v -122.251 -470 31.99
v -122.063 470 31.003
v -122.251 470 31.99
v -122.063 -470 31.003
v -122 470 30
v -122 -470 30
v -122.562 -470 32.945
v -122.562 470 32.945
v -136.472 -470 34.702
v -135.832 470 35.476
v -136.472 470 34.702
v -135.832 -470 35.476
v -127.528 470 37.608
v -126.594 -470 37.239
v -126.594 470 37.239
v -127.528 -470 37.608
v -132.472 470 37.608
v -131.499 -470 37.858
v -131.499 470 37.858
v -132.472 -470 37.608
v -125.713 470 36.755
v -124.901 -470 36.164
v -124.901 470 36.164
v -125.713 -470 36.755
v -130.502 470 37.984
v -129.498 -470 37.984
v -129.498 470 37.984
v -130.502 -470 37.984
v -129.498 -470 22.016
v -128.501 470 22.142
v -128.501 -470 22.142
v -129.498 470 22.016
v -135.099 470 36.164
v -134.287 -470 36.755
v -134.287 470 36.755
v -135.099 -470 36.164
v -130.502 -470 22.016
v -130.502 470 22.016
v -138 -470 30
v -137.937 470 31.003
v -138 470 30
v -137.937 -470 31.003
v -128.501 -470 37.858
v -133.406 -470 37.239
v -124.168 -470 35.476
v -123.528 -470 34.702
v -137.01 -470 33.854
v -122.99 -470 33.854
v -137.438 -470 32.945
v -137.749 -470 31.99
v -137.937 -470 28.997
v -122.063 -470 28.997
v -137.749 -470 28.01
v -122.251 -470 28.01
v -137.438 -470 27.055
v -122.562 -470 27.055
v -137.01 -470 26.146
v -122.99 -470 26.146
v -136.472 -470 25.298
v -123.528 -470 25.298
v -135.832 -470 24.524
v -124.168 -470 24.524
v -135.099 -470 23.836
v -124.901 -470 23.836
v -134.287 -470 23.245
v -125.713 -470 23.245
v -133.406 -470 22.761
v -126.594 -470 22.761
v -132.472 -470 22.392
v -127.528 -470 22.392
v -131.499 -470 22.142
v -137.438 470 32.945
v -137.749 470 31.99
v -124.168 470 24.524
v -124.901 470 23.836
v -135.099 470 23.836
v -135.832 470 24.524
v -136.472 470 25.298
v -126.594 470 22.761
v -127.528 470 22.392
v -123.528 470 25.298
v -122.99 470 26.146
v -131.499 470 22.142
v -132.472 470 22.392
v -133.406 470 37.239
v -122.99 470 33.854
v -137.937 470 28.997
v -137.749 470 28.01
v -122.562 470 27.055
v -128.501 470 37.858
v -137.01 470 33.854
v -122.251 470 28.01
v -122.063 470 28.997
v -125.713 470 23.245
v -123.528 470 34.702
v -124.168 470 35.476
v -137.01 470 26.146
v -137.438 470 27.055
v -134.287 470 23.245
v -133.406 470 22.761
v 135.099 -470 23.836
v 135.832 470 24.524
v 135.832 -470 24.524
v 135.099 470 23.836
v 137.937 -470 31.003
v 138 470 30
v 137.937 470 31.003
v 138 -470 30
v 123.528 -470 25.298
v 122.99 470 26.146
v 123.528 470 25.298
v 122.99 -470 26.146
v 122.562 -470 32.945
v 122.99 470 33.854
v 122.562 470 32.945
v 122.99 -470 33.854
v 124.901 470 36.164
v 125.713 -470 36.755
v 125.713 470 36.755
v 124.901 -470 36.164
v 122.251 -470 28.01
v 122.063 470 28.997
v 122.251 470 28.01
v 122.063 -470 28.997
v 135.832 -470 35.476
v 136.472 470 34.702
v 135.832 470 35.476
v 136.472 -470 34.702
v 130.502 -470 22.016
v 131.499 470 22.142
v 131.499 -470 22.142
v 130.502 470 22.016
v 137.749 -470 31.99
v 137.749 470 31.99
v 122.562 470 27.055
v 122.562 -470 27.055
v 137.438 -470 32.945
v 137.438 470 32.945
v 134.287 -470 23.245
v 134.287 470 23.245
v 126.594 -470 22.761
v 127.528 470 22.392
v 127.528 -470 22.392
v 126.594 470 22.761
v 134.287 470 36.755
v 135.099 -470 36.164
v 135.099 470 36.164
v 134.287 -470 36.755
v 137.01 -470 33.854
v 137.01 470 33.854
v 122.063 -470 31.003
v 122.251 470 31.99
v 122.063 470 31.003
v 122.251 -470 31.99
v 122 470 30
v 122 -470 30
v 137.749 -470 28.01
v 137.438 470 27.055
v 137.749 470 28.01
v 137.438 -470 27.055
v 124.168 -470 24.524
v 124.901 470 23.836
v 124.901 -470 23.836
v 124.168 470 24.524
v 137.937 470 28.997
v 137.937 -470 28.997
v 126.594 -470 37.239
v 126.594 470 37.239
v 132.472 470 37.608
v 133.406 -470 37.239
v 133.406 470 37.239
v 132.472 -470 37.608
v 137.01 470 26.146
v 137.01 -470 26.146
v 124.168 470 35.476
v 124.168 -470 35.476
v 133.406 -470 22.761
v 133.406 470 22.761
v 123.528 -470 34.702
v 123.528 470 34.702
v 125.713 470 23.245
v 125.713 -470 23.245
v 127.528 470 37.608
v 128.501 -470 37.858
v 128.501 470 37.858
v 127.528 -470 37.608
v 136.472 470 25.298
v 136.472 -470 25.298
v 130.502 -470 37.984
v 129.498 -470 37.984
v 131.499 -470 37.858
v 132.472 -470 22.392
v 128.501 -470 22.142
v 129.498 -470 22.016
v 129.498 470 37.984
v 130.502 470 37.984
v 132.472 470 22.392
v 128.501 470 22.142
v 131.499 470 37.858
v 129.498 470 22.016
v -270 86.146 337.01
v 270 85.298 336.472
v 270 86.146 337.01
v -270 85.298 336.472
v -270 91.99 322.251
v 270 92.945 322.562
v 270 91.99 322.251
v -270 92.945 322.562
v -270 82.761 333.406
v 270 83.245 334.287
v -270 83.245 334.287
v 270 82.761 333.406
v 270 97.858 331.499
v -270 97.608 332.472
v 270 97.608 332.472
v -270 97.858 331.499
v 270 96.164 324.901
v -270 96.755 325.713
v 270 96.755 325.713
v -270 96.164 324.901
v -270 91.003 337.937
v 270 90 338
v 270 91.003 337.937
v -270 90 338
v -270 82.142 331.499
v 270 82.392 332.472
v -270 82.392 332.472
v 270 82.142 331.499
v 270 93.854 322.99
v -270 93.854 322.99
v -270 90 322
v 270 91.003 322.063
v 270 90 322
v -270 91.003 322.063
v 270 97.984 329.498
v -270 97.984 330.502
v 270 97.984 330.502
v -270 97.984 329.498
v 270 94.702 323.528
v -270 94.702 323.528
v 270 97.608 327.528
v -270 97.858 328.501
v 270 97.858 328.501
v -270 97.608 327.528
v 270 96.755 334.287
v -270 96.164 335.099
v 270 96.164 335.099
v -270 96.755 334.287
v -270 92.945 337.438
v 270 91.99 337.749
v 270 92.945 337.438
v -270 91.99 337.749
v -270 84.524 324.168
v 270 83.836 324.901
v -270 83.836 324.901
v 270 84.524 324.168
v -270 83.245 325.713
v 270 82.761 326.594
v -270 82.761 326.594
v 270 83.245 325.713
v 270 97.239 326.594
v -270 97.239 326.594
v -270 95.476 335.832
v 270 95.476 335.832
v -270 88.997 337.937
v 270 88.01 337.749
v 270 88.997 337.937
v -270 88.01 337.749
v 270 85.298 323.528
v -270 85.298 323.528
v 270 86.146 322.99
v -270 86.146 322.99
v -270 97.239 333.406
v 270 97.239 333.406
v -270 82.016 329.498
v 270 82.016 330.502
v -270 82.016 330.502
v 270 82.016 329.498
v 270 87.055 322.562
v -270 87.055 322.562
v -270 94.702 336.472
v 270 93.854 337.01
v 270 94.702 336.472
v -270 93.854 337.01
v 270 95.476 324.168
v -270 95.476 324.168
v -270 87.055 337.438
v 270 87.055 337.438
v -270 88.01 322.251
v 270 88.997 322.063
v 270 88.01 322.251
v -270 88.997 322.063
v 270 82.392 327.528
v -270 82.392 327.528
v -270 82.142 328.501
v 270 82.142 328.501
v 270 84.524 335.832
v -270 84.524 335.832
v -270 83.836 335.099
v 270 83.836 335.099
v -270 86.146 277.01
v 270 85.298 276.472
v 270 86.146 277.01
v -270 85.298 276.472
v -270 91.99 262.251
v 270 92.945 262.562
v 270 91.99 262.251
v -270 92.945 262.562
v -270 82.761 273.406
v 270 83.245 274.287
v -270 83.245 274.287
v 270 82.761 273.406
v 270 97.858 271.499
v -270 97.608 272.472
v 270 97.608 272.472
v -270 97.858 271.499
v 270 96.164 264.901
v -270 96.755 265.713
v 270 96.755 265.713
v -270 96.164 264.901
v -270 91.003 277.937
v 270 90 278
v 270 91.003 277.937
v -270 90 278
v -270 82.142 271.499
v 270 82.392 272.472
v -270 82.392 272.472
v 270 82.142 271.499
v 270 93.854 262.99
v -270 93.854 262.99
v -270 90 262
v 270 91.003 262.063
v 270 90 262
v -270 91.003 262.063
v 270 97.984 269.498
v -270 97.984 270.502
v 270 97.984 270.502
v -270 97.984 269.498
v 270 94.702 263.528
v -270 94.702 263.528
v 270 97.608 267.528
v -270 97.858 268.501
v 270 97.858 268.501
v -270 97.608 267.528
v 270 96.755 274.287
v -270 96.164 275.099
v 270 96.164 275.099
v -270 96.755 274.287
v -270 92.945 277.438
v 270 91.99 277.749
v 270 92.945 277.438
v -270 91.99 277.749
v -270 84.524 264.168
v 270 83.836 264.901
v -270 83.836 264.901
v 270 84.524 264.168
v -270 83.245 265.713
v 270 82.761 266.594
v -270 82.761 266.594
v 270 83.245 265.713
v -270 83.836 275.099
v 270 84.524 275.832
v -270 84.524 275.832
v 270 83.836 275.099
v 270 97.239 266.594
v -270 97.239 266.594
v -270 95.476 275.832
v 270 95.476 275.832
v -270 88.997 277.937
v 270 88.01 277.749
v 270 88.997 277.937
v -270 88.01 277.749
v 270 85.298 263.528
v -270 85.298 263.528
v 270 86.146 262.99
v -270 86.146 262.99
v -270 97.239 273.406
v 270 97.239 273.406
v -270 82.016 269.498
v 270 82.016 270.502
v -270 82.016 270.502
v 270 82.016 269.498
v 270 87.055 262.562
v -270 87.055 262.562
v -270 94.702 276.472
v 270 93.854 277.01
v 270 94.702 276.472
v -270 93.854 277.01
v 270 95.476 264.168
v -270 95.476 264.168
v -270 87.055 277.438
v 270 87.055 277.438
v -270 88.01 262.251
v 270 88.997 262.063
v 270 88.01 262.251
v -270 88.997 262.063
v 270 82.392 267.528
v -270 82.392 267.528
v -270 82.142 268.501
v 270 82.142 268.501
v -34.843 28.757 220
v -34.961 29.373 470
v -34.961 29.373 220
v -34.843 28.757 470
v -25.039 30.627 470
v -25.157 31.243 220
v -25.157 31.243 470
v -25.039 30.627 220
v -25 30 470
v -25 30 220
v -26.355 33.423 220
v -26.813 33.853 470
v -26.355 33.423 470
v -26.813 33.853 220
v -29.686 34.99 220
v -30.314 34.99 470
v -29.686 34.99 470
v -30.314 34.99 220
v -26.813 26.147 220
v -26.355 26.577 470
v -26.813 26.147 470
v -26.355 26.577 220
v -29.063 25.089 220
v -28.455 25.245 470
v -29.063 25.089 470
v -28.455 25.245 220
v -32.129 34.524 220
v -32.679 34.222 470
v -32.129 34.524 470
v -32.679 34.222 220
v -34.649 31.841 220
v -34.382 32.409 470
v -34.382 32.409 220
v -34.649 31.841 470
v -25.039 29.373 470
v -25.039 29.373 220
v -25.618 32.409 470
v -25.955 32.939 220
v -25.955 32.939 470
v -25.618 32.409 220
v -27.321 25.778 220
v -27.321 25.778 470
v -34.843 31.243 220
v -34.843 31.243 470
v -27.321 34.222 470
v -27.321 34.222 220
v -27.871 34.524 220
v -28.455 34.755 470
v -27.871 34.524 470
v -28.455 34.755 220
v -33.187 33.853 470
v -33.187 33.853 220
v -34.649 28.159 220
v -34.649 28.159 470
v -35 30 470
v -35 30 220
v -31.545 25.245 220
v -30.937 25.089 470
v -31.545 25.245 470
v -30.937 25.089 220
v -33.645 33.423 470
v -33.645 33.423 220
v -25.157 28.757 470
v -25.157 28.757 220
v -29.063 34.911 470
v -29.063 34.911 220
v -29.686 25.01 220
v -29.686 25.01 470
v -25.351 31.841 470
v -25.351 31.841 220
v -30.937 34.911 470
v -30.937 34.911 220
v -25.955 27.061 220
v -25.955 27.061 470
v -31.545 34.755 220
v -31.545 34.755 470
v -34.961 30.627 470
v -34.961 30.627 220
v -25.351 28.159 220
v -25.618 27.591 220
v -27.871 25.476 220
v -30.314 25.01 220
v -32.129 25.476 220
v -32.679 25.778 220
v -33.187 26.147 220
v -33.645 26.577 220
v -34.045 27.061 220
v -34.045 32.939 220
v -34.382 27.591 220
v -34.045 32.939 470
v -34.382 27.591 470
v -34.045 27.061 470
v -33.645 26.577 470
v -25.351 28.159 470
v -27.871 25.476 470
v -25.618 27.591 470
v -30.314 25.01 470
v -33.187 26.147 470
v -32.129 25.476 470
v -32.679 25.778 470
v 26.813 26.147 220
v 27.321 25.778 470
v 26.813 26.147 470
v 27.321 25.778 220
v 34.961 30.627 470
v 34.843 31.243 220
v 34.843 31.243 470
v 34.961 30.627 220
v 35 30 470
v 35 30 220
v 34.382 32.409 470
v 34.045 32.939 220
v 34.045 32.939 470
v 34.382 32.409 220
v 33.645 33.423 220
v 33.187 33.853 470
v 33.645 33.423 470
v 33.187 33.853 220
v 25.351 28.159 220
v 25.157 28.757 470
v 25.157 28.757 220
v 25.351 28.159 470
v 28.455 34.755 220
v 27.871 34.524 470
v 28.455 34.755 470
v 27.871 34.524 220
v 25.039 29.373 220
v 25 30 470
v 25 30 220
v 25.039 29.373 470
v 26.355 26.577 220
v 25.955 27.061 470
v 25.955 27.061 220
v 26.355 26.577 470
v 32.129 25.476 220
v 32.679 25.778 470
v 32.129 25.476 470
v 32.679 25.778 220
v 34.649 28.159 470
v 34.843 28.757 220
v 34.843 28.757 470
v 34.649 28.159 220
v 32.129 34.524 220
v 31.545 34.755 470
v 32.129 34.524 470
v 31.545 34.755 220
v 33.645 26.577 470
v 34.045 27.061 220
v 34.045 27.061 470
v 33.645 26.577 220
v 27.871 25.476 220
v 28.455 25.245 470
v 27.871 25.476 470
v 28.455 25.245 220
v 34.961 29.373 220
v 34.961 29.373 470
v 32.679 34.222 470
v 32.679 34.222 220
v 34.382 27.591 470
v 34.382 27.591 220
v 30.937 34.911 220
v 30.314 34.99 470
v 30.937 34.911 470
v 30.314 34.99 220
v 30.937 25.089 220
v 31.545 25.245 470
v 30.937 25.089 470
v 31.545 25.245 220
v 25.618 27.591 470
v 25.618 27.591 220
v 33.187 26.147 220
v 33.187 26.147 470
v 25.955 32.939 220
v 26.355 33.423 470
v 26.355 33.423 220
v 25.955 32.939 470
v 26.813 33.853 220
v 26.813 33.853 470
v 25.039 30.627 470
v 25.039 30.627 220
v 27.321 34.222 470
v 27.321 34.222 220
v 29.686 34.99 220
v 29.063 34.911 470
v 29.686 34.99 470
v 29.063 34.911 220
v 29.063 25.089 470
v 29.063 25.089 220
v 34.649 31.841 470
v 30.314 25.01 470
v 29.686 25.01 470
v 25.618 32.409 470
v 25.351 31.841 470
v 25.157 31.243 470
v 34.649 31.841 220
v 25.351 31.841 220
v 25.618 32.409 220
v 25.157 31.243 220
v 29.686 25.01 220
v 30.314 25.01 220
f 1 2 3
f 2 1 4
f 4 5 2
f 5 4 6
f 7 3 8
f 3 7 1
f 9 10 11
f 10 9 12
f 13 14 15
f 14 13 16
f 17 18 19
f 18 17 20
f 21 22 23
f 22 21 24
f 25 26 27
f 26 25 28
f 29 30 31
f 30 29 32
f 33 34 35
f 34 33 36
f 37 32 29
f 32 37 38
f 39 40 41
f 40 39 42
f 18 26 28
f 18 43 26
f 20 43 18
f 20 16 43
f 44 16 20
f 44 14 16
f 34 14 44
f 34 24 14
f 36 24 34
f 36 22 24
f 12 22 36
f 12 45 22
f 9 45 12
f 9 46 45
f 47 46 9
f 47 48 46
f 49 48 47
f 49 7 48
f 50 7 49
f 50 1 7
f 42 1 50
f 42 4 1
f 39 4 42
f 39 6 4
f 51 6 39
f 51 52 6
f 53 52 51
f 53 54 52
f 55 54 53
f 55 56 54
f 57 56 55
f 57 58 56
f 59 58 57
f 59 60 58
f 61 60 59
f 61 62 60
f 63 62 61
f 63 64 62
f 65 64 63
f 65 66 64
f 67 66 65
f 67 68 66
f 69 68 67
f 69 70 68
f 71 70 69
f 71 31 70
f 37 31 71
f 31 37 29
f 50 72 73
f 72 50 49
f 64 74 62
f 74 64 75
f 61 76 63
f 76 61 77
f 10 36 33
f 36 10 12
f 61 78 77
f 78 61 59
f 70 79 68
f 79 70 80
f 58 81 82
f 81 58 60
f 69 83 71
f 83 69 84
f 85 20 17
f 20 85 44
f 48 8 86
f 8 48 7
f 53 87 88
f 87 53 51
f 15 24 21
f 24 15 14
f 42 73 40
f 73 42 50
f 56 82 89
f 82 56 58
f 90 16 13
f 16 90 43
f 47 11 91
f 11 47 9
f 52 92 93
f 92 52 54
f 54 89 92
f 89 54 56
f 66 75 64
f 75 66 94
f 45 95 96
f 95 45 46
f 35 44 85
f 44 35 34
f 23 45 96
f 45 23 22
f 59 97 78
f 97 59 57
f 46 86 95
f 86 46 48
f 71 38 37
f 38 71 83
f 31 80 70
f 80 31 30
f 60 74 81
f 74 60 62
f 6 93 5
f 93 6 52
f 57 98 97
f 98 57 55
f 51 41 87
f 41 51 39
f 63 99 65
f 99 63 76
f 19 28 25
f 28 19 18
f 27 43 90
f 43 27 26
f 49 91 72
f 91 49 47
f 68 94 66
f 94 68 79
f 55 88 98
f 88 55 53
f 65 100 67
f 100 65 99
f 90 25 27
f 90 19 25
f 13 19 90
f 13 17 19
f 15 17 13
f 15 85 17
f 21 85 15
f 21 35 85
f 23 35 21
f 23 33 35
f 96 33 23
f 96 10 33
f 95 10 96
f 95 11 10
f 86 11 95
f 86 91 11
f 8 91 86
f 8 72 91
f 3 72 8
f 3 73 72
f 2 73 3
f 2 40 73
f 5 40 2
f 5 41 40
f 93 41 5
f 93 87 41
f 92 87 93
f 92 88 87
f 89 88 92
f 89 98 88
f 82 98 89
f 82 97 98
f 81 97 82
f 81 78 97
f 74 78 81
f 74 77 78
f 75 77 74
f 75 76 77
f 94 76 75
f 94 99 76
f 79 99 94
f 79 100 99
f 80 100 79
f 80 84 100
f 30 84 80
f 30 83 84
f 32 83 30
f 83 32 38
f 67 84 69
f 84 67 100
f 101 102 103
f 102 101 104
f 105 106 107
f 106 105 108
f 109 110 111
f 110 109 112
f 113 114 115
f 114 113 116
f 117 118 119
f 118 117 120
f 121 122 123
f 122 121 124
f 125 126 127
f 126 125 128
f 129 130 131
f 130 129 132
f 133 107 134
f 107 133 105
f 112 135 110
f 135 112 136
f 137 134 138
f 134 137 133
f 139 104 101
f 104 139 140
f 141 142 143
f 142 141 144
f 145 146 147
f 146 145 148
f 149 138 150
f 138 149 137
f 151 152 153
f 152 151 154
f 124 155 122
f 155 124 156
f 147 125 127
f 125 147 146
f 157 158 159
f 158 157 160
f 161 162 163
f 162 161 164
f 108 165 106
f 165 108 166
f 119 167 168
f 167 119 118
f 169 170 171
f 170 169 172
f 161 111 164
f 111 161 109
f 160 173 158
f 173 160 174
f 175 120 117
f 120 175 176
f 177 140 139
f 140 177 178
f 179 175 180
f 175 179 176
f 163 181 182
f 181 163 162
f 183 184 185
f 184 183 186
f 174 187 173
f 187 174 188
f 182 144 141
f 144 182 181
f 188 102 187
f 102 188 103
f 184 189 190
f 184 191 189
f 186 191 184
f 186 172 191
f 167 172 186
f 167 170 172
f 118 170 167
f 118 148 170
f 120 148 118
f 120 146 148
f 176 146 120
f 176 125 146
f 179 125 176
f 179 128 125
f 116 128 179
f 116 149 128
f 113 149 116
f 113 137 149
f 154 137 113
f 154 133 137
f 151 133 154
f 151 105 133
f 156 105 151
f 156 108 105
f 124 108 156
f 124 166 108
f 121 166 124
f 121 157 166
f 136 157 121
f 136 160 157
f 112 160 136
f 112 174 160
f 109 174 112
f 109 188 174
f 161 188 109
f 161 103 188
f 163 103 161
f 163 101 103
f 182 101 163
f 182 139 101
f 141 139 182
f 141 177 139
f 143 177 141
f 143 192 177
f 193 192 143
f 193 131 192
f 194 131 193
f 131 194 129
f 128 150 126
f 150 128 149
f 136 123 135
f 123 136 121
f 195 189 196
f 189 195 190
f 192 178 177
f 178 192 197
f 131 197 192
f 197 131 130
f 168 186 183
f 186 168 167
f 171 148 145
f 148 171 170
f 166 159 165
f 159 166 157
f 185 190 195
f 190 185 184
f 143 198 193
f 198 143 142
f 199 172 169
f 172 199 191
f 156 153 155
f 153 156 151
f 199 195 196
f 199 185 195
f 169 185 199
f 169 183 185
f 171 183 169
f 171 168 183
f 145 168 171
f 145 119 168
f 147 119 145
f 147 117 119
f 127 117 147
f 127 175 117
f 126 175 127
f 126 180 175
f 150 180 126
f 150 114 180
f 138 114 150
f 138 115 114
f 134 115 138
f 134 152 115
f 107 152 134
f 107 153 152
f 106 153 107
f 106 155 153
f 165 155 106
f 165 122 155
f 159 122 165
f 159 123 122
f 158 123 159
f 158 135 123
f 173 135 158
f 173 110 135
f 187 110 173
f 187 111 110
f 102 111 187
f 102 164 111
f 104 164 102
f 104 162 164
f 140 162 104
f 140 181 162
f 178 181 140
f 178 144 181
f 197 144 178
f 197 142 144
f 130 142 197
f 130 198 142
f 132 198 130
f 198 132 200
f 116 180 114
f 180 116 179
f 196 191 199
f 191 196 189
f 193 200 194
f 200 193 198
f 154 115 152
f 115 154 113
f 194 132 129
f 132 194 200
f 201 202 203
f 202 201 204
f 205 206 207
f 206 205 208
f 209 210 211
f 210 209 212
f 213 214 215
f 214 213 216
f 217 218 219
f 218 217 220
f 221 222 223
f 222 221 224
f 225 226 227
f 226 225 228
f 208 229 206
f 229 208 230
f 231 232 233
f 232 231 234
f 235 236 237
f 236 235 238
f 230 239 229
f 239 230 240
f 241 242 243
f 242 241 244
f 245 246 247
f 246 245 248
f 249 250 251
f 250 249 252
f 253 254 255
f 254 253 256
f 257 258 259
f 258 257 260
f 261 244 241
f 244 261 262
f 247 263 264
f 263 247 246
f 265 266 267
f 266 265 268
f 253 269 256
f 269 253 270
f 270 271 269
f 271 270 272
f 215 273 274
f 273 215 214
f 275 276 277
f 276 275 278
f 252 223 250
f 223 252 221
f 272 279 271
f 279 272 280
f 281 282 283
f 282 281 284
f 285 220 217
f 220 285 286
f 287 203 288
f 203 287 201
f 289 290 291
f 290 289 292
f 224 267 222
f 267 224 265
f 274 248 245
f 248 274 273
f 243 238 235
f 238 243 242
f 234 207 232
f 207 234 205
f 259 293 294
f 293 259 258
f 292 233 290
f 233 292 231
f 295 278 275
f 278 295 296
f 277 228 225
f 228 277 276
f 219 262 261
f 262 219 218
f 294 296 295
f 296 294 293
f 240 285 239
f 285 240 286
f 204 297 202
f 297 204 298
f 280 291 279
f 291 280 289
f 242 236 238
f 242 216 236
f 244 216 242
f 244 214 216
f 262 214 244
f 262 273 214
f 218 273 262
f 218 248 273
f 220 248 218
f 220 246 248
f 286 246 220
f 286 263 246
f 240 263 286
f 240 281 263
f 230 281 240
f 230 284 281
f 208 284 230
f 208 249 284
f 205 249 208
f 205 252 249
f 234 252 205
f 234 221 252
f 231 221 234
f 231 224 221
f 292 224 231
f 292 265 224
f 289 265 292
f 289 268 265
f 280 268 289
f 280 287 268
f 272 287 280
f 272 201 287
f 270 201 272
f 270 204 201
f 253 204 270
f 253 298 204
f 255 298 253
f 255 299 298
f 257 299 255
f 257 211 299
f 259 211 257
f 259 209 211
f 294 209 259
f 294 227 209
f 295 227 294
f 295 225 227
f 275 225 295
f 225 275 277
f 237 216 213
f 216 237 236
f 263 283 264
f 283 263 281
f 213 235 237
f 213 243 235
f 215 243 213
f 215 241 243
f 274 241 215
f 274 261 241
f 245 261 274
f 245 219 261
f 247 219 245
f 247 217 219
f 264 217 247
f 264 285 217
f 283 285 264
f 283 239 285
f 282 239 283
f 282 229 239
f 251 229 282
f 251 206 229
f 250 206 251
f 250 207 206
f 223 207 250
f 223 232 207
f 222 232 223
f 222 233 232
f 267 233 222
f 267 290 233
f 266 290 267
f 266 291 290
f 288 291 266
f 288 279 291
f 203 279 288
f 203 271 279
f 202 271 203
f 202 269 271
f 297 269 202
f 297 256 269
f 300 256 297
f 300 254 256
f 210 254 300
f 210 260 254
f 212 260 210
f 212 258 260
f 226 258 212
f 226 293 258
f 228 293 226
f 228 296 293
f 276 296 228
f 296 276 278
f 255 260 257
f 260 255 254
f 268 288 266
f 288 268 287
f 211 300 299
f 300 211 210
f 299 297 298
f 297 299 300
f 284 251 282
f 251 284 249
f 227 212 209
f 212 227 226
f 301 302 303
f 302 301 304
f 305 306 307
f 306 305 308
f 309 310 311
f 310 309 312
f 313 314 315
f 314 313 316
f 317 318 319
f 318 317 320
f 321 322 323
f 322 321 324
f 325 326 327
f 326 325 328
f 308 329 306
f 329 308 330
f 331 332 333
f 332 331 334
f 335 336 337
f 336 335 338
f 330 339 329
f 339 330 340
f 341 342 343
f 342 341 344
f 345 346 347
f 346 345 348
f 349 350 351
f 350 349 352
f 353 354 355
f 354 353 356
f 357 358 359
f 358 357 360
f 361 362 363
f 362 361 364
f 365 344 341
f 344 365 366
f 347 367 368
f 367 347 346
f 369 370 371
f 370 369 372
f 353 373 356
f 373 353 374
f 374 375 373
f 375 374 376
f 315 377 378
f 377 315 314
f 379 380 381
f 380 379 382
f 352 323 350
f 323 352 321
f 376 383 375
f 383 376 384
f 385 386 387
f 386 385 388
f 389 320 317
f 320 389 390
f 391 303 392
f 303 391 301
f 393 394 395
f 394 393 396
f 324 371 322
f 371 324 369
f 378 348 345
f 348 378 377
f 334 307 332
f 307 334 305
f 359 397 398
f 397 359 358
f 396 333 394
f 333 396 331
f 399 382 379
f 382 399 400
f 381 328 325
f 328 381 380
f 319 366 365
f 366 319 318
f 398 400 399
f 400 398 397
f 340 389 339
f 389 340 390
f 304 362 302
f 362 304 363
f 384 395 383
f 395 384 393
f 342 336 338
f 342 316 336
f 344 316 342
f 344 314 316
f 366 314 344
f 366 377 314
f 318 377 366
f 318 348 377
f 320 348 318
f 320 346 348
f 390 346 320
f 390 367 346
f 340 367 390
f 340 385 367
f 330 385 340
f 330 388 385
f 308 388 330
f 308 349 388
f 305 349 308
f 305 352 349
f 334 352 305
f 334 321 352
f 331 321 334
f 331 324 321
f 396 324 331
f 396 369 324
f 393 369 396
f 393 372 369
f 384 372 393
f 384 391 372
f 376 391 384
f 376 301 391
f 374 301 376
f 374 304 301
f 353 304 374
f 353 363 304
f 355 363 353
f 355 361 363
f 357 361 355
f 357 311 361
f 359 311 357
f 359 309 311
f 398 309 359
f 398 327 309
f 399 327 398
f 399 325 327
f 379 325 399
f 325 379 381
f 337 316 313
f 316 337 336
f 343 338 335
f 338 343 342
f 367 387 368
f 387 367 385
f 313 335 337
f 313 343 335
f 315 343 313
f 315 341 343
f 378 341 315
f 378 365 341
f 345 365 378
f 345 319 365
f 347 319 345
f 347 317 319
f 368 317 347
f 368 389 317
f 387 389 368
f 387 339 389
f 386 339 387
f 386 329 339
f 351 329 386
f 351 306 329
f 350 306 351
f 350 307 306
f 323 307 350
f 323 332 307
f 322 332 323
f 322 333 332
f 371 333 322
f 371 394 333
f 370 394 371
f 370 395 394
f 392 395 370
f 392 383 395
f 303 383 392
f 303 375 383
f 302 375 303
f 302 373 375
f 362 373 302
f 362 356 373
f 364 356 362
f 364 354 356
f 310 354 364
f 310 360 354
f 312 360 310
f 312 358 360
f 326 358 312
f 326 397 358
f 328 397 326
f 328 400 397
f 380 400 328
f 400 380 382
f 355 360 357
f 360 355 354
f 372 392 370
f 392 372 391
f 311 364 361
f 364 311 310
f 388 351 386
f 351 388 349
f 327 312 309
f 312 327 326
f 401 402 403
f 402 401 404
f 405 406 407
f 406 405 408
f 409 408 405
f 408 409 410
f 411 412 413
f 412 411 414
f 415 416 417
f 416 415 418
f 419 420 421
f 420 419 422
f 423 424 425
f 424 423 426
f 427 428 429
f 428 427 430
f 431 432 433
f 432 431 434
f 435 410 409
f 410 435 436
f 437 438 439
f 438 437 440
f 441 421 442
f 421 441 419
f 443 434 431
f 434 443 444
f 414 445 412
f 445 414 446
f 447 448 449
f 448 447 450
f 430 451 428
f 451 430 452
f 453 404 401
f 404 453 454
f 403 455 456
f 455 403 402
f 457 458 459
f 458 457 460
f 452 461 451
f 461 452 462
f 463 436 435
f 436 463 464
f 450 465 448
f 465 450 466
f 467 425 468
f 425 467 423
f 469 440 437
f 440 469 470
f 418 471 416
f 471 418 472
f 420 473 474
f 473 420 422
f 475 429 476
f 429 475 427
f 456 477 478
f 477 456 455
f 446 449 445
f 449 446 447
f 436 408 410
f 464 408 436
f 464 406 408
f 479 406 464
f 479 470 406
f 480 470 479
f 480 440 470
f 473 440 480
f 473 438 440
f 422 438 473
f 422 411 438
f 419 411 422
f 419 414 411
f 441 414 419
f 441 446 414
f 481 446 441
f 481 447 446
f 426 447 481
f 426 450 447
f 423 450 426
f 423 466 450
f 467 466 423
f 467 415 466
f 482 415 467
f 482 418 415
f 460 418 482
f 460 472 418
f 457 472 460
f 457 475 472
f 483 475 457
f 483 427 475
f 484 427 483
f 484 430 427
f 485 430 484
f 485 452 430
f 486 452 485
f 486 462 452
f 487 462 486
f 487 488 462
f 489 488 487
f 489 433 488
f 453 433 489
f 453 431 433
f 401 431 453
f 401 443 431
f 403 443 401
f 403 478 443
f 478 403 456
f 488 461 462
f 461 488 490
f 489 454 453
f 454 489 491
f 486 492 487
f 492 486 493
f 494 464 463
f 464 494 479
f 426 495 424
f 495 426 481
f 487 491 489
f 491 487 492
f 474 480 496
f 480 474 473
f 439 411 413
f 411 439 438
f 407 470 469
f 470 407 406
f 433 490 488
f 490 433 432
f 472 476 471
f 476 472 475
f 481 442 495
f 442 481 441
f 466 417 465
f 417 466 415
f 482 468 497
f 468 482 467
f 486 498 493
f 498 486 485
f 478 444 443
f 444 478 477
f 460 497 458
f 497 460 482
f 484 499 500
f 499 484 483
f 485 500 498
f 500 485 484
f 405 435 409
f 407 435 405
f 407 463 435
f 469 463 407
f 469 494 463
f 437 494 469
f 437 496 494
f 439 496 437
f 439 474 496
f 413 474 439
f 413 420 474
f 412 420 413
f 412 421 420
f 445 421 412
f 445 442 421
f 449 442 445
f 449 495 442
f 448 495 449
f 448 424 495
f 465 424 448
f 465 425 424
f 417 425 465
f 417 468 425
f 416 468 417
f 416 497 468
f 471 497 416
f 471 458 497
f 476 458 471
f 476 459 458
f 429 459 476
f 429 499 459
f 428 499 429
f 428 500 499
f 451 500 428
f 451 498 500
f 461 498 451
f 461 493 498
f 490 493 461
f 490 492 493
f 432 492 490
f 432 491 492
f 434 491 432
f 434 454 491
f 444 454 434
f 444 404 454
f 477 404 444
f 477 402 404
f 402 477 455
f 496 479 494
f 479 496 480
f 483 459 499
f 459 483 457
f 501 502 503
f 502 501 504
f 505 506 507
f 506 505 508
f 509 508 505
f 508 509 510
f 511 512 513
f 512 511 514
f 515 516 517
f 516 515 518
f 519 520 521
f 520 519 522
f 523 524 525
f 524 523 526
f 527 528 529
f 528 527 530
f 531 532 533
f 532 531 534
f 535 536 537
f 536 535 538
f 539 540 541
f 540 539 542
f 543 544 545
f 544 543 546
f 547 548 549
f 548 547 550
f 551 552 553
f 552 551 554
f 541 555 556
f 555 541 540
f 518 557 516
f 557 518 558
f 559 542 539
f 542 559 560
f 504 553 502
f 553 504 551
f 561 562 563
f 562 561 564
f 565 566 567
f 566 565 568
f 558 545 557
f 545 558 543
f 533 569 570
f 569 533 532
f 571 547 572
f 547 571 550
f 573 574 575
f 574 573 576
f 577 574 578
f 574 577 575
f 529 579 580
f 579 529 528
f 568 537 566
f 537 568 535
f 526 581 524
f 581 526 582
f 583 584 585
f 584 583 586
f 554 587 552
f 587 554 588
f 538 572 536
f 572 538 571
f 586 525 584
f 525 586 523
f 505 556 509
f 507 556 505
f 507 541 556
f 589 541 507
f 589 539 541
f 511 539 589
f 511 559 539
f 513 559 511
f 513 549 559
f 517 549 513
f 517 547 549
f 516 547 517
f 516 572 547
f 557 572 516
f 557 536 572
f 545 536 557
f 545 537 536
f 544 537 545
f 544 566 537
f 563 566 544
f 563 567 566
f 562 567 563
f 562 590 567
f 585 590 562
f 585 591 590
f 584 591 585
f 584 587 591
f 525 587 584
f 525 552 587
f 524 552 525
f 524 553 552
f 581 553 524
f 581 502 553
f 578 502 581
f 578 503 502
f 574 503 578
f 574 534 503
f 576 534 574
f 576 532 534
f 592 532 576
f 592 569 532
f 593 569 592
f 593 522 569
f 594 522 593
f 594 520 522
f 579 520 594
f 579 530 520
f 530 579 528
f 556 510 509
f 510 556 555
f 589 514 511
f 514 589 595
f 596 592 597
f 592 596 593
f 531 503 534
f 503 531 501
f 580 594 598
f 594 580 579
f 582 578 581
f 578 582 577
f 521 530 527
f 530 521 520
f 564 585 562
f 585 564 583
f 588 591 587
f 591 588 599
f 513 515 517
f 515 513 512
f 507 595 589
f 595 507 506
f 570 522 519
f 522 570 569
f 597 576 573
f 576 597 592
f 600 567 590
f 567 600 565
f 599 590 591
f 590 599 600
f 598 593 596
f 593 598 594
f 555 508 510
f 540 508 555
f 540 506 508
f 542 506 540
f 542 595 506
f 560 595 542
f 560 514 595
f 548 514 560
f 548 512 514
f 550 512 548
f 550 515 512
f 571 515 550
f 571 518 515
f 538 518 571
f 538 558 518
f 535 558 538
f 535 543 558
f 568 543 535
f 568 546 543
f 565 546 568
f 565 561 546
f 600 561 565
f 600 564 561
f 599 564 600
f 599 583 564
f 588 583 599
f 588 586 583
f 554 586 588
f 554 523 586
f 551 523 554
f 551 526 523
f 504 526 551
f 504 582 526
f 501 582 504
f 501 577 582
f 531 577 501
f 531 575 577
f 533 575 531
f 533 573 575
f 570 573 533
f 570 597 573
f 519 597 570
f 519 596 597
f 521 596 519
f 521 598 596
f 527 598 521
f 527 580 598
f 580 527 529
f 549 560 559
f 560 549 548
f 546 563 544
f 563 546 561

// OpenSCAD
// file: potencekress.scad
module PotenceKress () {
 color("Khaki"){
 translate(v=[0,-5,0]) rotate (a=[90,0,0])
   linear_extrude(height = 10, center = true, convexity = 10)
   import(file = "potencekress.dxf",layer="Fond",origin = [70,80]);
 translate(v=[-55,-40,0]) rotate (a=[90,0,-90]) 
   linear_extrude(height = 10, center = true, convexity = 10)
   import(file = "potencekress.dxf",layer="Droite",origin = [190,80]);
 translate(v=[55,-40,0]) rotate (a=[90,0,-90]) 
   linear_extrude(height = 10, center = true)
   import(file = "potencekress.dxf",layer="Gauche",origin = [280,80]);
 translate(v=[0,-30,75]) rotate (a=[0,0,90]) 
   linear_extrude(height = 10, center = true, convexity = 10)
   import(file = "potencekress.dxf",layer="Haut1",origin = [360,80]);
 translate(v=[0,-60,65]) rotate (a=[180,0,0])
   linear_extrude(height = 10, center = true, convexity = 10)
   import(file = "potencekress.dxf",layer="Haut2",origin = [310,200]);
 translate(v=[0,-40,-65]) rotate (a=[0,0,0]) 
   linear_extrude(height = 10, center = true, convexity = 0)
   import(file = "potencekress.dxf",layer="Bas1",origin = [190,210]);
 translate(v=[0,-40,-55]) rotate (a=[0,180,0]) 
   linear_extrude(height = 10, center = true, convexity = 400)
   import(file = "potencekress.dxf",layer="Bas2",origin = [60,210]);
 }
}

//PotenceKress();
// file: piecesmeca.scad
module axe10(taille) {
  color("DimGray")
  cylinder(r=5,h=taille);
}

module axe16(taille) {
  color("DimGray")
  cylinder(r=8,h=taille);
}
// file: cpl10mm.scad
module Coin(e) {
 color("BurlyWood")
  rotate (a=[90,0,0]) linear_extrude (height = 10, center=false) 
  import (file = "cpl10mm.dxf", layer = "coin", convexity =10);
}
//Coin (0);

module EquereB (e) {
 color("BurlyWood")
  translate (v =[0,100,0]) rotate (a=[90,0,-90])
  linear_extrude (height = 10, center=false, convexity=10) 
  import (file = "cpl10mm.dxf", layer = "equere");
}
//Equere(0);

module EquereH (e) {
 color("BurlyWood")
  translate (v =[0,-100,0])
  linear_extrude (height = 10, center=false, convexity=10) 
  import (file = "cpl10mm.dxf", layer = "equereH");
}
//EquereH(0);
// file: profilesmotedis.scad
module 20x20(longueur) {
 color ("lightgrey")
 linear_extrude(height = longueur, center = true, convexity = 10) 
 import(file = "profil20x20.dxf");
}

module 20x40(longueur) {
 color ("lightgrey")
 linear_extrude(height = longueur, center = true, convexity = 10) 
 import(file = "profil20x40.dxf");
}

module 20x60(longueur) {
 color ("lightgrey")
 linear_extrude(height = longueur, center = true, convexity = 10) 
 import(file = "profil20x60.dxf");
}
// main file
$fn = 50;
ecl = 0; // vue eclatée ecl=1
cnc_P = 900;
cnc_L = 500;
cnc_H = 300;
X_Pos =0;
Y_Pos =0;
Z_Pos =0;

include <profilesmotedis.scad>;
include <cpl10mm.scad>;
include <piecesmeca.scad>;

// cadre
translate(v=[-cnc_L/2-20-ecl*50,0,0])rotate (a=[-90,-90,0])
 20x60(cnc_P+40);
translate(v=[cnc_L/2+ecl*50,0,0])rotate (a=[-90,-90,0])
 20x60(cnc_P+40);
translate(v=[0,-cnc_P/2-20-ecl*50,0])rotate (a=[0,-90,0]) 20x20(cnc_L);
translate(v=[0,-cnc_P/2-20-ecl*50,40])rotate (a=[0,-90,0]) 20x20(cnc_L);
translate(v=[0,cnc_P/2+ecl*50,0])rotate (a=[0,-90,0]) 20x20(cnc_L);
translate(v=[0,cnc_P/2+ecl*50,40])rotate (a=[0,-90,0]) 20x20(cnc_L);
//cpl
translate (v=[-cnc_L/2-20-ecl*100,-cnc_P/2-20-ecl*100,0])Coin(ecl);
translate (v=[cnc_L/2+20+ecl*100,-cnc_P/2-30-ecl*100,0])
  rotate (a=[0,0,180]) Coin(ecl);
translate (v=[-cnc_L/2-20-ecl*100,cnc_P/2+30+ecl*100,0])Coin(ecl);
translate (v=[cnc_L/2+20+ecl*100,cnc_P/2+20+ecl*100,0])
  rotate (a=[0,0,180]) Coin(ecl);
translate (v=[-cnc_L/2-20-ecl*100,140,0]) EquereB(ecl);
translate (v=[cnc_L/2+30+ecl*100,140,0]) EquereB(ecl);


//portique
translate(v=[-cnc_L/2-ecl*50,40,cnc_H/2+60+ecl*50])rotate (a=[0,0,90]) 20x40(cnc_H);
translate(v=[-cnc_L/2-ecl*50,100,cnc_H/2+60+ecl*50])rotate (a=[0,0,90]) 20x40(cnc_H);
translate(v=[cnc_L/2+20+ecl*50,40,cnc_H/2+60+ecl*50])rotate (a=[0,0,90]) 20x40(cnc_H);
translate(v=[cnc_L/2+20+ecl*50,100,cnc_H/2+60+ecl*50])rotate (a=[0,0,90]) 20x40(cnc_H);
translate(v=[0,120,cnc_H+ecl*50])rotate (a=[0,-90,0]) 20x60(cnc_L);
translate(v=[0,60,cnc_H-60+ecl*50])rotate (a=[-90,0,90]) 20x60(cnc_L);
//cpl
translate (v=[-cnc_L/2-20-ecl*100,40,60+cnc_H+ecl*100]) EquereH(ecl);
translate (v=[cnc_L/2+20+ecl*100,40,70+cnc_H+ecl*100]) rotate (a=[0,180,]) EquereH(ecl);

//axe x
translate([-cnc_L/2+120,cnc_P/2+20,30])rotate([90,0,0]) axe16(cnc_P+40);
translate([cnc_L/2-120,cnc_P/2+20,30])rotate([90,0,0]) axe16(cnc_P+40);
//axe y
translate([-cnc_L/2-20,90,cnc_H+30])rotate([0,90,0]) axe16(cnc_L+40);
translate([-cnc_L/2-20,90,cnc_H-30])rotate([0,90,0]) axe16(cnc_L+40);
//axe z
translate([-30+Y_Pos,30,220]) axe10(cnc_H-50);
translate([30+Y_Pos,30,220]) axe10(cnc_H-50);

//potence kress
use <potencekress.scad>;
translate (v=[0+Y_Pos,0-ecl*50,cnc_H+Z_Pos]) PotenceKress();  
